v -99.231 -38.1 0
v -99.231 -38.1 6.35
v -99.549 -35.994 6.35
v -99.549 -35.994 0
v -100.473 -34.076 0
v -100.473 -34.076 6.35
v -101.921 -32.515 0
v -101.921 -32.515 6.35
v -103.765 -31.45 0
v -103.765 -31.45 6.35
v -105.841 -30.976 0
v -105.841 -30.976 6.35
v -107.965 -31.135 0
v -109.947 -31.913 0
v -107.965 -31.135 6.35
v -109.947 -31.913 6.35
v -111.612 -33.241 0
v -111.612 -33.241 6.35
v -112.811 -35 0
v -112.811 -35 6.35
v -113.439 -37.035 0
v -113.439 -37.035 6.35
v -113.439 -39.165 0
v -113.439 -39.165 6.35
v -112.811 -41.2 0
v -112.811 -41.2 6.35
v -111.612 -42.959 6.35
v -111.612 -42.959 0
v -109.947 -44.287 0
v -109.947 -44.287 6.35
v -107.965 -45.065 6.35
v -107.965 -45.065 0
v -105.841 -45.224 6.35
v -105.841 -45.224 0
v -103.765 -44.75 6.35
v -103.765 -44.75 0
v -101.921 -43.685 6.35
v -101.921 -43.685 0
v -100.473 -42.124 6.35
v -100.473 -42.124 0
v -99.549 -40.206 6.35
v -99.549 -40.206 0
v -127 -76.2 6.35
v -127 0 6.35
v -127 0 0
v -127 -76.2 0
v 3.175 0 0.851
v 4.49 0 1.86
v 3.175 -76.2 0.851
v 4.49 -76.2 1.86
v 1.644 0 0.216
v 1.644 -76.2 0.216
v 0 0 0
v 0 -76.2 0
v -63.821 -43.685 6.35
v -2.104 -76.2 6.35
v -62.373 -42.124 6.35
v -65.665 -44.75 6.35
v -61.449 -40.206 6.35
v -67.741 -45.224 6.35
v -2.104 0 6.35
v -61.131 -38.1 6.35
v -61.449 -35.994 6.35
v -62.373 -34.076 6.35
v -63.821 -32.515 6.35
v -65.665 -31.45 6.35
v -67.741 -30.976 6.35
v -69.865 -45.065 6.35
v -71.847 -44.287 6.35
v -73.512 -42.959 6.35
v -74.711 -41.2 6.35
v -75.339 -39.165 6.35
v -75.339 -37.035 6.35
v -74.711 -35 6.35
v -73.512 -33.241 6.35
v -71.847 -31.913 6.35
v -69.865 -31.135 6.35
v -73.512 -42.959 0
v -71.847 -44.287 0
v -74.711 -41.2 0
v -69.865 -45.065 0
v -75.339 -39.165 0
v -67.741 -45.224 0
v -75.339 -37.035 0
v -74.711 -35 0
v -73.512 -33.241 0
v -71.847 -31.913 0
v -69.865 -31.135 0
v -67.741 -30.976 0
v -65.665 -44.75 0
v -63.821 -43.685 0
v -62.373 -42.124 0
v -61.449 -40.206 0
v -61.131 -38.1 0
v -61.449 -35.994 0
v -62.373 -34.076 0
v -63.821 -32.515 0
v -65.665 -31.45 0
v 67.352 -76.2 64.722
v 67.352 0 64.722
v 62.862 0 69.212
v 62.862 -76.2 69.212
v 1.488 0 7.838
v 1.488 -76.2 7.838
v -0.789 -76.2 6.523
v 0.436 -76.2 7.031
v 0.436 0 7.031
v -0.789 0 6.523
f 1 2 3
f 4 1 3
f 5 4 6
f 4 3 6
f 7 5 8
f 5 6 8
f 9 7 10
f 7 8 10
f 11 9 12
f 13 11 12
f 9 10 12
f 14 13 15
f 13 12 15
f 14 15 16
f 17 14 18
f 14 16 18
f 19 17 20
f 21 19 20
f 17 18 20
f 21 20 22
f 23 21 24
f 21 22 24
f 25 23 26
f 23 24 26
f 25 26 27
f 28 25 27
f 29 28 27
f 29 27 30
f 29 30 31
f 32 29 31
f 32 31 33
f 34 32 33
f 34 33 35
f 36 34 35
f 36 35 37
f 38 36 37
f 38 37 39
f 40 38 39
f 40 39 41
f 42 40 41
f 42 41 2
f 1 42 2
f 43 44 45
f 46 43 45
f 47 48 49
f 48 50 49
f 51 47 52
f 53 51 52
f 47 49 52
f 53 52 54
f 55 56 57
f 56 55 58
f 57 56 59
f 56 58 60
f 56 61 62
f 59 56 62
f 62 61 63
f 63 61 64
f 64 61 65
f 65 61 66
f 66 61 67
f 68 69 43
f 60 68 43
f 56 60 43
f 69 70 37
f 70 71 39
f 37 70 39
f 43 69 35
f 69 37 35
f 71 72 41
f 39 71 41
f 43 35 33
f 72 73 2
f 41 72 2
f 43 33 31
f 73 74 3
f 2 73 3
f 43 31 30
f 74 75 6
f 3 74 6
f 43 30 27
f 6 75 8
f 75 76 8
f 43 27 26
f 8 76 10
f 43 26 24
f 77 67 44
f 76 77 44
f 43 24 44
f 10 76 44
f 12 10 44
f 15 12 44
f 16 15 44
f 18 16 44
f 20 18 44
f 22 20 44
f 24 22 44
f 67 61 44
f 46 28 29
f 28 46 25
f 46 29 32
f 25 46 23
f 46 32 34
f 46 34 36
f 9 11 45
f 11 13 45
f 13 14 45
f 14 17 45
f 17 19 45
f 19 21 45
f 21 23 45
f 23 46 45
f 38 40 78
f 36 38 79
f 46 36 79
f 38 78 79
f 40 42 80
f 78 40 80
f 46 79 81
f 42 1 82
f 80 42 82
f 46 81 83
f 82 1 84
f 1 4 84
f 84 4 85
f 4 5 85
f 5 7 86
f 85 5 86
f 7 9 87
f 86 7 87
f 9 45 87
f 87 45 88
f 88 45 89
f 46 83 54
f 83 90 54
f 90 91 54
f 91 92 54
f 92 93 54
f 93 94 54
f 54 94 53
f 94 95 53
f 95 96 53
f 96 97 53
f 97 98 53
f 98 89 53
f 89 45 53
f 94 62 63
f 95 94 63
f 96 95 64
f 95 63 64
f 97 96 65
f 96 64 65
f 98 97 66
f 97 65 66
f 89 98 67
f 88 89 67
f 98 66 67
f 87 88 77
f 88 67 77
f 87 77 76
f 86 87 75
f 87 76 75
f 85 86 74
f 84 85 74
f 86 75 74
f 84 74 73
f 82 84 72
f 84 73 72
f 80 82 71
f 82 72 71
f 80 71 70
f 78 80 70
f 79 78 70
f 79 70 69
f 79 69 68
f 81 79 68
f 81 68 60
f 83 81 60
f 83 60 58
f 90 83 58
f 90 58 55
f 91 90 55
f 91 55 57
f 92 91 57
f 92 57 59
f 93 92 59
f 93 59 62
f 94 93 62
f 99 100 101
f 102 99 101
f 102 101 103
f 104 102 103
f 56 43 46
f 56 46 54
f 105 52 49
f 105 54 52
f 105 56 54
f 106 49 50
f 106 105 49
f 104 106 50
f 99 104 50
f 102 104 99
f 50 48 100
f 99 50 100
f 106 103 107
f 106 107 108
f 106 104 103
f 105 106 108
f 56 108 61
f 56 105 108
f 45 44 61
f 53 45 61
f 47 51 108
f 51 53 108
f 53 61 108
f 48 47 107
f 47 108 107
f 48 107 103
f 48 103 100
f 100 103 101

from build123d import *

# Parameters (mm, degrees)
F1_DEPTH = 76.2
F2_R     = 5.08
F3_R     = 6.35
F4_R     = 7.14375
F5_DEPTH = 25.4


with BuildPart() as f1:
    # F0 (on Front) → F1 (new body)
    with BuildSketch(Plane.XZ):
        Polygon((-127, 0), (0, 0), (2.630256, 0), (4.490128, 1.859872), (67.351921, 64.721665), (62.861793, 69.211793), (0, 6.35), (-127, 6.35), align=None)
    extrude(amount=F1_DEPTH)

    # F2
    f2_edges = [f1.edges().sort_by_distance(p)[0] for p in [
        (0, -38.1, 6.35),
    ]]
    fillet(f2_edges, radius=F2_R)

    # F3
    f3_edges = [f1.edges().sort_by_distance(p)[0] for p in [
        (2.630256, -38.1, 0),
    ]]
    fillet(f3_edges, radius=F3_R)

    # F4 (on face) → F5 (cut)
    with BuildSketch(Plane.XY.offset(6.35)):
        with Locations((-106.3752, -38.1)):
            Circle(F4_R)
        with Locations((-68.2752, -38.1)):
            Circle(F4_R)
    extrude(amount=-F5_DEPTH, mode=Mode.SUBTRACT)


solid = f1.part
